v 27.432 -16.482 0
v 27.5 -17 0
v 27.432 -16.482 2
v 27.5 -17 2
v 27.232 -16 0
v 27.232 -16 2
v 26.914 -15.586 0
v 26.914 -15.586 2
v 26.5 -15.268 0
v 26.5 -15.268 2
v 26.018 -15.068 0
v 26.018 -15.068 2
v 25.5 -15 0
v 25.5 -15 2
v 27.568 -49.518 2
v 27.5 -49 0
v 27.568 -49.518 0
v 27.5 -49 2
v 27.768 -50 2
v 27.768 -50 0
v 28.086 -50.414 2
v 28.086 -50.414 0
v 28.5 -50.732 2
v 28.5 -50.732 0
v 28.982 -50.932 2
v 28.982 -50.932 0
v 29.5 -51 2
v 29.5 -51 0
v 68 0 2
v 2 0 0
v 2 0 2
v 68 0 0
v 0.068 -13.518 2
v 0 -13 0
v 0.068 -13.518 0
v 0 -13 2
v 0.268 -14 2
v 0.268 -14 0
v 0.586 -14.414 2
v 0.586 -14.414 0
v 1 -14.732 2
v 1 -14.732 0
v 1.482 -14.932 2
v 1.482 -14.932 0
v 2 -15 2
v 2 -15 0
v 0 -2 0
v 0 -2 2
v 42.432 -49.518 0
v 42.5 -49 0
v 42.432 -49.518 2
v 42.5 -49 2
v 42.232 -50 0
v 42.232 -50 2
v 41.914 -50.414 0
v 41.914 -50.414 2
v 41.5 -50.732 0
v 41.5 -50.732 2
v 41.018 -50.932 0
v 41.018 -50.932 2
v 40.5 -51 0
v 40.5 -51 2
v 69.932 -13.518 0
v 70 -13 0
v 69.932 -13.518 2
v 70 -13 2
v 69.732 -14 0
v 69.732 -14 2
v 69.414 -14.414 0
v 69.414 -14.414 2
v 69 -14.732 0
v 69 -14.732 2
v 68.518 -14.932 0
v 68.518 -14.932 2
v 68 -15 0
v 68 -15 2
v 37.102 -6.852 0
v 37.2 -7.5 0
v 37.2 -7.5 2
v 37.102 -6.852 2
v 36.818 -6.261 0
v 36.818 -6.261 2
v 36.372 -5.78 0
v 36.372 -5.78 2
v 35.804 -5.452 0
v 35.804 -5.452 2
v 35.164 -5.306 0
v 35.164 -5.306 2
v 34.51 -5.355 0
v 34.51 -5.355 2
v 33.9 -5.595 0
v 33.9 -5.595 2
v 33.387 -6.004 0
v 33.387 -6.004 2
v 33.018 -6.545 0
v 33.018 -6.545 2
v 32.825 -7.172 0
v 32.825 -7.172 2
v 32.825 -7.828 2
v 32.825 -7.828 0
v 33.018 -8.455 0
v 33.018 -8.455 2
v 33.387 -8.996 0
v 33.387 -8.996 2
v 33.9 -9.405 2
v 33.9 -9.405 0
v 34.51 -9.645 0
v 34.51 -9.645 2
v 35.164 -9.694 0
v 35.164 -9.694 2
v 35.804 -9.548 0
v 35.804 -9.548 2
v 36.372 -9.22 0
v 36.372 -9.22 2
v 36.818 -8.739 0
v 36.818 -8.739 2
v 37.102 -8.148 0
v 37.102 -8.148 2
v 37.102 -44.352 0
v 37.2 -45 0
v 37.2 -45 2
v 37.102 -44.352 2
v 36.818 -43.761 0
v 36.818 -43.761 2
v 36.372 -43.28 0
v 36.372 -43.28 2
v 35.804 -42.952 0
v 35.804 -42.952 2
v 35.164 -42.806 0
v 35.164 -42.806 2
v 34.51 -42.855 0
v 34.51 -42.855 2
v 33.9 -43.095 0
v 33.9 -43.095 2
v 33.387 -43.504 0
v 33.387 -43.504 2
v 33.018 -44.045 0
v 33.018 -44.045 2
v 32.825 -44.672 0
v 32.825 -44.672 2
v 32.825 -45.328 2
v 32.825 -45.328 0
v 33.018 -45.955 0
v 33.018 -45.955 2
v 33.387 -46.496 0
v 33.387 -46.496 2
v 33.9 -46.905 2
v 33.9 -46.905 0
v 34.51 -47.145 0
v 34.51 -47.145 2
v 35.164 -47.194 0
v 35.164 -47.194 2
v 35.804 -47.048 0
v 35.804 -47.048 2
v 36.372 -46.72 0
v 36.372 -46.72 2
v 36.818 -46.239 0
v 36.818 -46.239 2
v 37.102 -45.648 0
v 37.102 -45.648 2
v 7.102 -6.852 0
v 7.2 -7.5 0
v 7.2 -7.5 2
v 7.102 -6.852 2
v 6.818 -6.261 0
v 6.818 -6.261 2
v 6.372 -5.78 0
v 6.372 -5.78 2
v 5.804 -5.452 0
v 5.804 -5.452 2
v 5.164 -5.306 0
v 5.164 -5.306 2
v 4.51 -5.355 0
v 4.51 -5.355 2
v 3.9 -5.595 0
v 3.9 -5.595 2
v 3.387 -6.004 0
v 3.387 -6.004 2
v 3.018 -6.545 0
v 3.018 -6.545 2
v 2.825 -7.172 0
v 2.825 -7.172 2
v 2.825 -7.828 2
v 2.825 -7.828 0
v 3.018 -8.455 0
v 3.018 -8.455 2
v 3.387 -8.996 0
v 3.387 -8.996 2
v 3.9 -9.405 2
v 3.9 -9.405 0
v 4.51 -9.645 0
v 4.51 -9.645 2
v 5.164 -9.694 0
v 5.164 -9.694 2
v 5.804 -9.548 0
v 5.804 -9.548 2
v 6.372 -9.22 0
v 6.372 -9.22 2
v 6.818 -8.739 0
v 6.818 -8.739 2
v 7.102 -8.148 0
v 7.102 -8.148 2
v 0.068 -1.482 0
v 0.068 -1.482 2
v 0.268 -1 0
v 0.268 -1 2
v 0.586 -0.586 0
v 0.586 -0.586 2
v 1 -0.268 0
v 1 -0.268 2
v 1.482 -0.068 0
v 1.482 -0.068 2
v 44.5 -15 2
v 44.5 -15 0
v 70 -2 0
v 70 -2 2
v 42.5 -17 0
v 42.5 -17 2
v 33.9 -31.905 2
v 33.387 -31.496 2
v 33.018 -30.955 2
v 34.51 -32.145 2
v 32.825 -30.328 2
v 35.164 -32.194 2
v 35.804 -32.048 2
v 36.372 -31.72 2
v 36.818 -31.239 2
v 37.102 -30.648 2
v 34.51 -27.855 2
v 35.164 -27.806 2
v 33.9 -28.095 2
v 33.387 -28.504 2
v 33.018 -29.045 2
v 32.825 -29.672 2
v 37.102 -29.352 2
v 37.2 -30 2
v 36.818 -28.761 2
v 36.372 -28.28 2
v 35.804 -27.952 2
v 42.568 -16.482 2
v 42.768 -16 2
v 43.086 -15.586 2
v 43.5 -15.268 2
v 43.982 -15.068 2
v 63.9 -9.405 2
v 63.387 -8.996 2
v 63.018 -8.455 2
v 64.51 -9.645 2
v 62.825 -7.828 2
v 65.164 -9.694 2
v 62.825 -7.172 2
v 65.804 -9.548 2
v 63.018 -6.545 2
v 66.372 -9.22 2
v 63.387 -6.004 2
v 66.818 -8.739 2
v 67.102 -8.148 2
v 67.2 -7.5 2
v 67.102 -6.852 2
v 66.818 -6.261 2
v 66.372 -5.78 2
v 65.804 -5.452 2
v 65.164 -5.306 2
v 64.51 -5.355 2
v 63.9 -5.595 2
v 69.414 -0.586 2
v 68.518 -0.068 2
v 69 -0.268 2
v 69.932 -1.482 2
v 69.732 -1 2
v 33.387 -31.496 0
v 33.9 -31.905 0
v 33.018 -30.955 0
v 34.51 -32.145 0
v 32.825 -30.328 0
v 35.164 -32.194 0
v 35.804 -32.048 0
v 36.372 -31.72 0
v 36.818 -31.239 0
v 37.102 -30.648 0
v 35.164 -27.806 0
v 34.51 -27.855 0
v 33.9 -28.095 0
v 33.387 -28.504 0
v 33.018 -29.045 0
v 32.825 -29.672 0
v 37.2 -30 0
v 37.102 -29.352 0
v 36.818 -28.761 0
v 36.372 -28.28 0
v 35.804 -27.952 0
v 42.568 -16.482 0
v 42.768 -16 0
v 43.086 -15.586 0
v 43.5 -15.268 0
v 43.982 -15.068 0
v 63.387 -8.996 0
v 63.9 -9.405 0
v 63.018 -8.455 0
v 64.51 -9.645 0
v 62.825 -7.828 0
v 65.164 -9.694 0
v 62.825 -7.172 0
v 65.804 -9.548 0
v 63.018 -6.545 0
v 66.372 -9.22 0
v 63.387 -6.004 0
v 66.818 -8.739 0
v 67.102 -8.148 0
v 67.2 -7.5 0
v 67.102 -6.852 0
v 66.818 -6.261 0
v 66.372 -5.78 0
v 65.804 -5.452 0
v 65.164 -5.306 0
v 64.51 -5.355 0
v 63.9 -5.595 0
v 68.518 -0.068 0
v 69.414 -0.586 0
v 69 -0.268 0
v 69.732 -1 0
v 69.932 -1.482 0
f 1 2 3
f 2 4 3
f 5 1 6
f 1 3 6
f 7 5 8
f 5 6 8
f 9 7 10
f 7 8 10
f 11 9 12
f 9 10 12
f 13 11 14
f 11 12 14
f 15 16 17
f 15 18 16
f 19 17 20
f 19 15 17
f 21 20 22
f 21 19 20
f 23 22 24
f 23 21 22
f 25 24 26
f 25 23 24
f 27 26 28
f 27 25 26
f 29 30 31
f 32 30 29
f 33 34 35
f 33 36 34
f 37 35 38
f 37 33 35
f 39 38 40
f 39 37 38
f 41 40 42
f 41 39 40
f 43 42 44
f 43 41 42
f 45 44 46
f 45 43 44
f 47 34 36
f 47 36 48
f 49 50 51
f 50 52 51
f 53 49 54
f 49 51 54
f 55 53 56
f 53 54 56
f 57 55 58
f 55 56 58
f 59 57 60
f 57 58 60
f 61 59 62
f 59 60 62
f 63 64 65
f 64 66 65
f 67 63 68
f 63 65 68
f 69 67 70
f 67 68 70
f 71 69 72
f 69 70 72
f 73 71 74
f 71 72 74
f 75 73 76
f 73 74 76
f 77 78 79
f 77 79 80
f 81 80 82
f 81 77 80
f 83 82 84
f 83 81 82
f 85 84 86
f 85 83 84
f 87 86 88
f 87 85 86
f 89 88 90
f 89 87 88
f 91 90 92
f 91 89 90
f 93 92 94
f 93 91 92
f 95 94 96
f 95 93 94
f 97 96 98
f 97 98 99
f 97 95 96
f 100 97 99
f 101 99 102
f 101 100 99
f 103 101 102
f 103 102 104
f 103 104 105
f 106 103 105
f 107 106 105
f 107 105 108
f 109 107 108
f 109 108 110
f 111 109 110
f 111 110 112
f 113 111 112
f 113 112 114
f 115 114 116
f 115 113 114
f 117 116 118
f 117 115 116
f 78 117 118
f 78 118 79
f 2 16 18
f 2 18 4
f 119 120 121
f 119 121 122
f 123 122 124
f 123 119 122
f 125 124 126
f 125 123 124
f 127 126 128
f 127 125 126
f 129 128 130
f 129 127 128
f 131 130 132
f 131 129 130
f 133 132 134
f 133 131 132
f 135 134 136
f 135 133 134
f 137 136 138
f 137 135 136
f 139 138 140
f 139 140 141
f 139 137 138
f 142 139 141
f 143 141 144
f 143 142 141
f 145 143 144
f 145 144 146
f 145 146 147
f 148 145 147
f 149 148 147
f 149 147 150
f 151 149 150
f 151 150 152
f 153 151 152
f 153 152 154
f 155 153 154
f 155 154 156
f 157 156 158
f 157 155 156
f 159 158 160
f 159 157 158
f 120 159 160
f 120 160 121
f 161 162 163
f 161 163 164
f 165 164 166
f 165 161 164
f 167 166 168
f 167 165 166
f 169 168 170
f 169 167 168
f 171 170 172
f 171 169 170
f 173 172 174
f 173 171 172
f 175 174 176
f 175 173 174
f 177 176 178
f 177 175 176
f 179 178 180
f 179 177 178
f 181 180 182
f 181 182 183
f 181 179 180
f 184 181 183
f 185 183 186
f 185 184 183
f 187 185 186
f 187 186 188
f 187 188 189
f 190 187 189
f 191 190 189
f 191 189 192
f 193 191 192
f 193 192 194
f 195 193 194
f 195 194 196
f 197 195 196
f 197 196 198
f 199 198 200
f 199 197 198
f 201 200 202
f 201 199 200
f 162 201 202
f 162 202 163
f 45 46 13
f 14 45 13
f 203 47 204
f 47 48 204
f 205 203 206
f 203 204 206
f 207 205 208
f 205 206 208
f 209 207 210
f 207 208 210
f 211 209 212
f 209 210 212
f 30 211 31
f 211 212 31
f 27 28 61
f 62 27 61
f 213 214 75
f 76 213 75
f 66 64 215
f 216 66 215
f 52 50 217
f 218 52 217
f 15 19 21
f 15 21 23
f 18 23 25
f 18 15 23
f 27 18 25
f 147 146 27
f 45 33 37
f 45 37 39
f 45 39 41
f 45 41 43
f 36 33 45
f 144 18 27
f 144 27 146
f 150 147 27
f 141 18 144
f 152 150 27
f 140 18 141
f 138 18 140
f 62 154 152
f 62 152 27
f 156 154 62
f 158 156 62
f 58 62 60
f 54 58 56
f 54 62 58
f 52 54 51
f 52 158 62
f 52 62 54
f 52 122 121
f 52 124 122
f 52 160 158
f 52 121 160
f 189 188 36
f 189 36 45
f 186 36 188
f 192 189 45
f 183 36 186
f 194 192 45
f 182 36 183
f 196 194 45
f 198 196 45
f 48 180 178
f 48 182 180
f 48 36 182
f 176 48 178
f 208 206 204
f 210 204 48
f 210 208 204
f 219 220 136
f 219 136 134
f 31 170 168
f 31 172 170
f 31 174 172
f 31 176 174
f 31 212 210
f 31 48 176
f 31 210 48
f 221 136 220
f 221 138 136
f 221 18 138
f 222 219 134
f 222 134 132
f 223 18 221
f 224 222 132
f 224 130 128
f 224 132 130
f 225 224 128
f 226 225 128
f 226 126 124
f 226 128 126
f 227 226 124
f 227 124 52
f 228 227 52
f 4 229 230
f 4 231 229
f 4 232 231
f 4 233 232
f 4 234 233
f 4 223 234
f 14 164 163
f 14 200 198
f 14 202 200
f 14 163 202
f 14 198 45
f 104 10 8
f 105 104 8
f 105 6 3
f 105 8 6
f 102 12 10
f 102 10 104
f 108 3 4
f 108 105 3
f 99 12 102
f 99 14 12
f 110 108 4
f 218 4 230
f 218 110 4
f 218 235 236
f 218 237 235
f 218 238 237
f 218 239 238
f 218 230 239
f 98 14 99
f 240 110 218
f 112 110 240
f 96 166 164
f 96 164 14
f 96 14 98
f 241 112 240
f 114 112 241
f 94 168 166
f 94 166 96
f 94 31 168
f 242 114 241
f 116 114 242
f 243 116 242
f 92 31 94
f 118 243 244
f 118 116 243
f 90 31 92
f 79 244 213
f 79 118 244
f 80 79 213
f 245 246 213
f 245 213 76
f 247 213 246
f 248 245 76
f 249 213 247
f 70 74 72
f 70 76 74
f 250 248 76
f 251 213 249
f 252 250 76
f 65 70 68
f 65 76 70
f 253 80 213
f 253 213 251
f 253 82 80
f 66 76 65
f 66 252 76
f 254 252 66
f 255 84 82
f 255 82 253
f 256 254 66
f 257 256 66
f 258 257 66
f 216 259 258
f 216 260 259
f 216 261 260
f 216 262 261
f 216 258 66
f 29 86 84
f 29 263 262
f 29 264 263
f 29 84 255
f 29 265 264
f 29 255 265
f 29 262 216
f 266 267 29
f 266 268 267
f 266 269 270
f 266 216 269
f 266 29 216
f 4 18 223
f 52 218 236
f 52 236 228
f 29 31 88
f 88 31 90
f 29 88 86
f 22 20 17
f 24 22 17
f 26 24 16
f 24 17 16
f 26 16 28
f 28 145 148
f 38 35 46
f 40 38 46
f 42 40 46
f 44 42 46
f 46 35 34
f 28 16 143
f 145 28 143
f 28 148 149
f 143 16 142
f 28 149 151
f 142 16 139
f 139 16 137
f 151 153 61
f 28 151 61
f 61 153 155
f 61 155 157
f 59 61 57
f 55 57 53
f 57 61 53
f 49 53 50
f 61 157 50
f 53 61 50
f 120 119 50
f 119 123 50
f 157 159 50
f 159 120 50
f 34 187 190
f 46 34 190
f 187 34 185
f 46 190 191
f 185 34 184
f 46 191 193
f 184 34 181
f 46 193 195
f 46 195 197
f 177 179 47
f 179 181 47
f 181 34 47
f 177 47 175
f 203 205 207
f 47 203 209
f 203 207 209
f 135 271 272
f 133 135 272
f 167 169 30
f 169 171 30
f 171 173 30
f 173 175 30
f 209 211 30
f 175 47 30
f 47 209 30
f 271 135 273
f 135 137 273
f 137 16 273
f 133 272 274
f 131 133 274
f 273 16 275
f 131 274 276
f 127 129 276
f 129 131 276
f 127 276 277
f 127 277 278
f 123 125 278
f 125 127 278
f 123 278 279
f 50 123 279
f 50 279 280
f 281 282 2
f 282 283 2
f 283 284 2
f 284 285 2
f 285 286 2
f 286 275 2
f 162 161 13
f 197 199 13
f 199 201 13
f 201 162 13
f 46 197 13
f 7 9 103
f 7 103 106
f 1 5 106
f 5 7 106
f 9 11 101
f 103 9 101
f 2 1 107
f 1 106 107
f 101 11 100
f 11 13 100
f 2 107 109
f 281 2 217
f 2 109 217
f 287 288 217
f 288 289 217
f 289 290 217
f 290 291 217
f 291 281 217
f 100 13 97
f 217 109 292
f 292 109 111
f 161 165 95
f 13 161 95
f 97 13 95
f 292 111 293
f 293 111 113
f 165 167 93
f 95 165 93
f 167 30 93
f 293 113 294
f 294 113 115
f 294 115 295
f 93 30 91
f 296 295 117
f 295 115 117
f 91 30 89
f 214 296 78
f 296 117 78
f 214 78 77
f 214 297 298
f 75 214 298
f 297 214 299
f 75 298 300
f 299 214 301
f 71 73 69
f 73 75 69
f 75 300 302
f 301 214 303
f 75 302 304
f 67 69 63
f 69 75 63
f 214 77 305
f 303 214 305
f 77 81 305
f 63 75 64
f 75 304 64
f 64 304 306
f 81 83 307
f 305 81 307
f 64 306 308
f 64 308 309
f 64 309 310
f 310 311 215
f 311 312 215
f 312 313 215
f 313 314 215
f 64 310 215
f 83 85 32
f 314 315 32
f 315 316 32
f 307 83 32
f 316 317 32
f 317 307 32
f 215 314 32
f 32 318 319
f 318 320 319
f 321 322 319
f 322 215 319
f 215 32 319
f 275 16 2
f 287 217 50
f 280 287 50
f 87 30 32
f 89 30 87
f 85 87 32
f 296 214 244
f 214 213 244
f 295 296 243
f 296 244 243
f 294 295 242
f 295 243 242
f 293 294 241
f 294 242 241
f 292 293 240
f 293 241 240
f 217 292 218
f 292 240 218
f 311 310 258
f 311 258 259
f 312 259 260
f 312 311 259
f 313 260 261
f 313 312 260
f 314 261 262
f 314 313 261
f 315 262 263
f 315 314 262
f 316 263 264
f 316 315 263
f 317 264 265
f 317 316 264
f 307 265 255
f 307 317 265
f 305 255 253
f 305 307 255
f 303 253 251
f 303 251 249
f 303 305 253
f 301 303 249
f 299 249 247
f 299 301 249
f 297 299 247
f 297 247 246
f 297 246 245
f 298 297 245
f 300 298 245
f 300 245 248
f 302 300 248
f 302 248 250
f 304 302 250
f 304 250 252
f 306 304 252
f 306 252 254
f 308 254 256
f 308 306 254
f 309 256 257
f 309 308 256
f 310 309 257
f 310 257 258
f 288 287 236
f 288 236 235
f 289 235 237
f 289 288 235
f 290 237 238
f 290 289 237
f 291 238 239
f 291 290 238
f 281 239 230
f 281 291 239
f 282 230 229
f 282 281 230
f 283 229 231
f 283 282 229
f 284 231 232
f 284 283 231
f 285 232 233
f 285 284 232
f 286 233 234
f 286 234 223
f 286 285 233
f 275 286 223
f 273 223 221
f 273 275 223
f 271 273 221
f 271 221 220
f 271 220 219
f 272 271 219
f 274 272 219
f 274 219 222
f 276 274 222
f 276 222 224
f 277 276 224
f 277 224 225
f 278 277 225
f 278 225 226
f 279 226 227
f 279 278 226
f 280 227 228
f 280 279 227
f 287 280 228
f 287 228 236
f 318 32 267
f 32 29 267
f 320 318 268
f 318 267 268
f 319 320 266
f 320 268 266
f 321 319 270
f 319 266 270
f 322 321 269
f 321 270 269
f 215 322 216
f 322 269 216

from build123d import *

# Parameters (mm, degrees)
SKETCH_1_W      = 27.5
SKETCH_1_H      = 15
SKETCH_1_R      = 2.2
SKETCH_1_W_2    = 15
SKETCH_1_H_2    = 36
EXTRUDE_1_DEPTH = 2
FILLET_1_R      = 2


with BuildPart() as part:
    # 草图1 → 凸台-拉伸1 (new body)
    # profile 1 of 4: a face of its own
    with BuildSketch(Plane.XY):
        with Locations((13.75, -7.5)):
            Rectangle(SKETCH_1_W, SKETCH_1_H)
        with Locations((5, -7.5)):
            Circle(SKETCH_1_R, mode=Mode.SUBTRACT)
    # profile 2 of 4: a face of its own
    with BuildSketch(Plane.XY):
        with Locations((56.25, -7.5)):
            Rectangle(SKETCH_1_W, SKETCH_1_H)
        with Locations((65, -7.5)):
            Circle(SKETCH_1_R, mode=Mode.SUBTRACT)
    # profile 3 of 4: a face of its own
    with BuildSketch(Plane.XY):
        with Locations((35, -7.5)):
            Rectangle(SKETCH_1_W_2, SKETCH_1_H)
        with Locations((35, -7.5)):
            Circle(SKETCH_1_R, mode=Mode.SUBTRACT)
    # profile 4 of 4: a face of its own
    with BuildSketch(Plane.XY):
        with Locations((35, -33)):
            Rectangle(SKETCH_1_W_2, SKETCH_1_H_2)
        with Locations((35, -45)):
            Circle(SKETCH_1_R, mode=Mode.SUBTRACT)
        with Locations((35, -30)):
            Circle(SKETCH_1_R, mode=Mode.SUBTRACT)
    extrude(amount=EXTRUDE_1_DEPTH)

    # 圆角1
    fillet_1_edges = [part.edges().sort_by_distance(p)[0] for p in [
        (0, -15, 1),
        (0, 0, 1),
        (70, 0, 1),
        (70, -15, 1),
        (42.5, -15, 1),
        (42.5, -51, 1),
        (27.5, -51, 1),
        (27.5, -15, 1),
    ]]
    fillet(fillet_1_edges, radius=FILLET_1_R)


solid = part.part
